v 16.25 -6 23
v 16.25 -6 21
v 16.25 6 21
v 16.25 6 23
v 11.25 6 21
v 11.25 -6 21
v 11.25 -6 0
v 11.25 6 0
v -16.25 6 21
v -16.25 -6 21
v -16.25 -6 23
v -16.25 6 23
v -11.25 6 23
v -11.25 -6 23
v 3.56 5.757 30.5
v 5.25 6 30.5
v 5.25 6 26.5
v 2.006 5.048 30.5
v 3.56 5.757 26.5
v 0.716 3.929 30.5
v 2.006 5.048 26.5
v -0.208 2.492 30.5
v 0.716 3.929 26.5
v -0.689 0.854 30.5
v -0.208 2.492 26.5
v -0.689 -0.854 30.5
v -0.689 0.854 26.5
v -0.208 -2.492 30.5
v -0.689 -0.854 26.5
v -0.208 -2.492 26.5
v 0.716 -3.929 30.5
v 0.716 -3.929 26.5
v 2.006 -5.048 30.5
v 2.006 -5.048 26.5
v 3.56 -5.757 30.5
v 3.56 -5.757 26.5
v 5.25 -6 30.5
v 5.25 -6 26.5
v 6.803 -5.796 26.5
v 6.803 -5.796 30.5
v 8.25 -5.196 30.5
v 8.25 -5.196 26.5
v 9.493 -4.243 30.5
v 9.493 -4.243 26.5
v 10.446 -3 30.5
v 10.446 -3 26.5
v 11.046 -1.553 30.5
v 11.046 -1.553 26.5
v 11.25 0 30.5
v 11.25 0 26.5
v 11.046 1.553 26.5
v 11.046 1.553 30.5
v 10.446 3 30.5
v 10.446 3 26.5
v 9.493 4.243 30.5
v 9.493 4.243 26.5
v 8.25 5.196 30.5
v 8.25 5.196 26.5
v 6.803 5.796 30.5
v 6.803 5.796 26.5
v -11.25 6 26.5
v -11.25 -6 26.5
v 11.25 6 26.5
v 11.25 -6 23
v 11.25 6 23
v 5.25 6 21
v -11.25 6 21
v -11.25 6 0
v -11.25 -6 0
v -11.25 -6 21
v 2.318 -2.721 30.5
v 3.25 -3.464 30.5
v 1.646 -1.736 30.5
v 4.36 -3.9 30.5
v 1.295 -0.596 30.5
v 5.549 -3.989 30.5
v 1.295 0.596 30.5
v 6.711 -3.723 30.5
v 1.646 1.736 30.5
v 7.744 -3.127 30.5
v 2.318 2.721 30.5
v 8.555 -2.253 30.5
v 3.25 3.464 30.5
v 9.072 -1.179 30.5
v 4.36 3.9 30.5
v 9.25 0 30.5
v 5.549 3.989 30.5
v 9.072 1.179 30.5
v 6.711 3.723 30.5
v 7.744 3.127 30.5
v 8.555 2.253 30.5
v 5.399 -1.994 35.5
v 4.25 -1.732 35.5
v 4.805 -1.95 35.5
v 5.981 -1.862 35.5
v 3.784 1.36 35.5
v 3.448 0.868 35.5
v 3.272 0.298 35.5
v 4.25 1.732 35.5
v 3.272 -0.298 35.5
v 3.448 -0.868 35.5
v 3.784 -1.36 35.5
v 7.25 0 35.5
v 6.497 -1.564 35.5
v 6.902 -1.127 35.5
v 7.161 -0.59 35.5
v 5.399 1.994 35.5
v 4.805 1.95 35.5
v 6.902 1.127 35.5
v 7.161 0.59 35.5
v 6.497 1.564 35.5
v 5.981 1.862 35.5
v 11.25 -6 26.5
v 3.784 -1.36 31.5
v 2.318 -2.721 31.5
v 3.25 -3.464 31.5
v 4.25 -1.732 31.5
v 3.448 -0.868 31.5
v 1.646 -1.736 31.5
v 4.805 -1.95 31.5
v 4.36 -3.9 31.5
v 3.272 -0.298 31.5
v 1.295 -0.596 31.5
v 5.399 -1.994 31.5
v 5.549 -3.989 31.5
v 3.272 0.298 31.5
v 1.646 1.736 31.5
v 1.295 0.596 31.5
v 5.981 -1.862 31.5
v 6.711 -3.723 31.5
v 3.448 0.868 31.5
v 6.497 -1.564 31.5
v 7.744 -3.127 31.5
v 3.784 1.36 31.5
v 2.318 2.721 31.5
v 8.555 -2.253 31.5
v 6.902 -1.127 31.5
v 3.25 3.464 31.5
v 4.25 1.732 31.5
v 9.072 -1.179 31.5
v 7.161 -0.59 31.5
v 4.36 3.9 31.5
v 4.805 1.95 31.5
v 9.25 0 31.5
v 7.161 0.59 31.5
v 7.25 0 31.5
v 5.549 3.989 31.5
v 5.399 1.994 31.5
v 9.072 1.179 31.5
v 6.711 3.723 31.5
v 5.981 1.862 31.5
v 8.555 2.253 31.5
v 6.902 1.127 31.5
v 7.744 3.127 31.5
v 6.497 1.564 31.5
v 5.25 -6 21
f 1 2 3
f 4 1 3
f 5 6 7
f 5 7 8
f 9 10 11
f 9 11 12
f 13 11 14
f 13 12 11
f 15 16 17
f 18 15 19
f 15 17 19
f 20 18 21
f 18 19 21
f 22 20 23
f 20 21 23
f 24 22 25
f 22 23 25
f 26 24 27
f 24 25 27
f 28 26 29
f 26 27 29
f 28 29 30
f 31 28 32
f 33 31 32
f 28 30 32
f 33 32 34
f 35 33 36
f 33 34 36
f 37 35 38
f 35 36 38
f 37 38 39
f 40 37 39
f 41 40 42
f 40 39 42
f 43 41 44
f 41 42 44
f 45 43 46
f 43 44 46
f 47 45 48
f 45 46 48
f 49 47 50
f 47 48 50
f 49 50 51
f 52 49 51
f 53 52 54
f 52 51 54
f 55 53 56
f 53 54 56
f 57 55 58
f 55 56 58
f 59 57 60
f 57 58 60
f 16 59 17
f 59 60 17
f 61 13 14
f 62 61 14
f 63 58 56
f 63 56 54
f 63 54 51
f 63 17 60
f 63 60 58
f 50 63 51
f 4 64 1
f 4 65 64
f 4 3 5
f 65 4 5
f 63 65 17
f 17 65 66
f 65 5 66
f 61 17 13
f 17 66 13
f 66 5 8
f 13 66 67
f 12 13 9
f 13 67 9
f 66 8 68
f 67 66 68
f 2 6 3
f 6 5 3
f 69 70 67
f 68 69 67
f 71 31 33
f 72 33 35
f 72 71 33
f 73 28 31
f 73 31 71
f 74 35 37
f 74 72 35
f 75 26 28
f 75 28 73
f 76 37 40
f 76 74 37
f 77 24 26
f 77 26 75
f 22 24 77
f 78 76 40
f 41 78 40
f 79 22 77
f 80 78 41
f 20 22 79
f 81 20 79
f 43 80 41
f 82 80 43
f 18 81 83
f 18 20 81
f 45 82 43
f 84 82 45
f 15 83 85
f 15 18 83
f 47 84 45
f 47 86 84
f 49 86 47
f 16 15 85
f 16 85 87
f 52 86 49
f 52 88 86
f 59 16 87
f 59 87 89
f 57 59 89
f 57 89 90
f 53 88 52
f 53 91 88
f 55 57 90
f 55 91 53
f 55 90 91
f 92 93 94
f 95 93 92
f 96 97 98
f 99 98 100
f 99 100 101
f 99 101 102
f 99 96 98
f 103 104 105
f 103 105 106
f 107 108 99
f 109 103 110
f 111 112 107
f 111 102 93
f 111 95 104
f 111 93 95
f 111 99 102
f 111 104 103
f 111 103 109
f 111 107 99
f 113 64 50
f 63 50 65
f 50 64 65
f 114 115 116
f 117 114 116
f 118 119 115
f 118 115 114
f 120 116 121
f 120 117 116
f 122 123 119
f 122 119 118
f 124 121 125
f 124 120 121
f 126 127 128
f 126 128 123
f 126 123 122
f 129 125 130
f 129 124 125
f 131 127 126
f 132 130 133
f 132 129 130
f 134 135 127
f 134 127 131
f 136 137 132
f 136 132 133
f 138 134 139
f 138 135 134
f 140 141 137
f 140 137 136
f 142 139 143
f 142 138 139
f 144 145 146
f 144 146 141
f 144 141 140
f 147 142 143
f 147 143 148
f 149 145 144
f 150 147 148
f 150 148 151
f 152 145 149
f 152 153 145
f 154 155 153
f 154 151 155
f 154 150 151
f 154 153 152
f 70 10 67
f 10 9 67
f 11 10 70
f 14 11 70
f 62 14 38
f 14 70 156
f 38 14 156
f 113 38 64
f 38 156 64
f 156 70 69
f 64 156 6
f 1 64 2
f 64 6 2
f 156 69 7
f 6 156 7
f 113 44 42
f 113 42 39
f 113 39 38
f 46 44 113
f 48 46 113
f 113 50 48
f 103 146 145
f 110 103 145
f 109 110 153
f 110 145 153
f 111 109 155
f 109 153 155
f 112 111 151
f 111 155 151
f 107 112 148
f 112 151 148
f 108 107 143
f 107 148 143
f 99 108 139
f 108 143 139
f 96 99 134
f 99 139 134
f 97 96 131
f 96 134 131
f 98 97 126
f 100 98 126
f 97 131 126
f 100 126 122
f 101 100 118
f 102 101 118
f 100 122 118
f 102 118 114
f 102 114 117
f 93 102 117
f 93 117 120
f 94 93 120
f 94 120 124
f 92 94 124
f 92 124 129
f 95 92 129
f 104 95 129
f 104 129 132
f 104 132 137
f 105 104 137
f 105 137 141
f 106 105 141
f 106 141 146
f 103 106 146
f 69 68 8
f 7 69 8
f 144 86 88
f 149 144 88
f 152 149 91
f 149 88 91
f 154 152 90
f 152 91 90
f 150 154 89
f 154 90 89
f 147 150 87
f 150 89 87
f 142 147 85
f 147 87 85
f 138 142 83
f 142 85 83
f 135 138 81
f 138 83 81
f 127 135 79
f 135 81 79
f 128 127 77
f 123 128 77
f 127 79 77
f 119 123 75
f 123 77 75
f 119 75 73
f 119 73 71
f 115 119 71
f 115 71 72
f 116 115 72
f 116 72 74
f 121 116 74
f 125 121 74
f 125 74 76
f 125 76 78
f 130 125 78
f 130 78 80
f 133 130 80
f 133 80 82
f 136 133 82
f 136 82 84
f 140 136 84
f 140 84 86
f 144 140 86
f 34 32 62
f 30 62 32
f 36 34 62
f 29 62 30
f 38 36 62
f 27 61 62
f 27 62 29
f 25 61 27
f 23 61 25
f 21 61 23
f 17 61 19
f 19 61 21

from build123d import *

# Parameters (mm, degrees)
F0_W     = 22.5
F0_H     = 12
F1_DEPTH = 21
F2_W     = 5
F2_H     = 12
F2_R     = 4
F2_R_2   = 2
F3_DEPTH = 2
F4_DEPTH = 5.5
F5_DEPTH = 9.5
F6_DEPTH = 10.5
F7_DEPTH = 14.5


with BuildPart() as f1:
    # F0 (on Top) → F1 (new body)
    with BuildSketch(Plane.XY):
        Rectangle(F0_W, F0_H)
    extrude(amount=F1_DEPTH)

    # F2 (on face) → F3 (join)
    with BuildSketch(Plane.XY.offset(21)):
        with BuildLine():
            Line((11.25, 6), (5.25, 6))
            ThreePointArc((5.25, 6), (9.4926406871, 4.2426406871), (11.25, 0))
            Line((11.25, 0), (11.25, 6))
        make_face()
        with Locations((-13.75, 0)):
            Rectangle(F2_W, F2_H)
        Polygon((16.25, 6), (11.25, 6), (11.25, 0), (11.25, -6), (16.25, -6), align=None)
        with BuildLine():
            Line((11.25, -6), (11.25, 0))
            ThreePointArc((11.25, 0), (9.4926406871, -4.2426406871), (5.25, -6))
            Line((5.25, -6), (11.25, -6))
        make_face()
        with BuildLine():
            ThreePointArc((11.25, 0), (9.4926406871, 4.2426406871), (5.25, 6))
            ThreePointArc((5.25, 6), (-0.75, 0), (5.25, -6))
            ThreePointArc((5.25, -6), (9.4926406871, -4.2426406871), (11.25, 0))
        make_face()
        with Locations((5.25, 0)):
            Circle(F2_R, mode=Mode.SUBTRACT)
        with Locations((5.25, 0)):
            Circle(F2_R)
        with Locations((5.25, 0)):
            Circle(F2_R_2, mode=Mode.SUBTRACT)
        with BuildLine():
            Line((5.25, 6), (-11.25, 6))
            Line((-11.25, 6), (-11.25, -6))
            Line((-11.25, -6), (5.25, -6))
            ThreePointArc((5.25, -6), (-0.75, 0), (5.25, 6))
        make_face()
    extrude(amount=F3_DEPTH)

    # F2 (on face) → F4 (join)
    with BuildSketch(Plane.XY.offset(21)):
        with BuildLine():
            Line((5.25, 6), (-11.25, 6))
            Line((-11.25, 6), (-11.25, -6))
            Line((-11.25, -6), (5.25, -6))
            ThreePointArc((5.25, -6), (-0.75, 0), (5.25, 6))
        make_face()
        with BuildLine():
            ThreePointArc((11.25, 0), (9.4926406871, 4.2426406871), (5.25, 6))
            ThreePointArc((5.25, 6), (-0.75, 0), (5.25, -6))
            ThreePointArc((5.25, -6), (9.4926406871, -4.2426406871), (11.25, 0))
        make_face()
        with Locations((5.25, 0)):
            Circle(F2_R, mode=Mode.SUBTRACT)
        with Locations((5.25, 0)):
            Circle(F2_R)
        with Locations((5.25, 0)):
            Circle(F2_R_2, mode=Mode.SUBTRACT)
        with BuildLine():
            Line((11.25, -6), (11.25, 0))
            ThreePointArc((11.25, 0), (9.4926406871, -4.2426406871), (5.25, -6))
            Line((5.25, -6), (11.25, -6))
        make_face()
        with BuildLine():
            Line((11.25, 6), (5.25, 6))
            ThreePointArc((5.25, 6), (9.4926406871, 4.2426406871), (11.25, 0))
            Line((11.25, 0), (11.25, 6))
        make_face()
    extrude(amount=F4_DEPTH)

    # F2 (on face) → F5 (join)
    with BuildSketch(Plane.XY.offset(21)):
        with BuildLine():
            ThreePointArc((11.25, 0), (9.4926406871, 4.2426406871), (5.25, 6))
            ThreePointArc((5.25, 6), (-0.75, 0), (5.25, -6))
            ThreePointArc((5.25, -6), (9.4926406871, -4.2426406871), (11.25, 0))
        make_face()
        with Locations((5.25, 0)):
            Circle(F2_R, mode=Mode.SUBTRACT)
        with Locations((5.25, 0)):
            Circle(F2_R)
        with Locations((5.25, 0)):
            Circle(F2_R_2, mode=Mode.SUBTRACT)
    extrude(amount=F5_DEPTH)

    # F2 (on face) → F6 (join)
    with BuildSketch(Plane.XY.offset(21)):
        with Locations((5.25, 0)):
            Circle(F2_R)
        with Locations((5.25, 0)):
            Circle(F2_R_2, mode=Mode.SUBTRACT)
    extrude(amount=F6_DEPTH)

    # F2 (on face) → F7 (join)
    with BuildSketch(Plane.XY.offset(21)):
        with Locations((5.25, 0)):
            Circle(F2_R_2)
    extrude(amount=F7_DEPTH)


solid = f1.part
